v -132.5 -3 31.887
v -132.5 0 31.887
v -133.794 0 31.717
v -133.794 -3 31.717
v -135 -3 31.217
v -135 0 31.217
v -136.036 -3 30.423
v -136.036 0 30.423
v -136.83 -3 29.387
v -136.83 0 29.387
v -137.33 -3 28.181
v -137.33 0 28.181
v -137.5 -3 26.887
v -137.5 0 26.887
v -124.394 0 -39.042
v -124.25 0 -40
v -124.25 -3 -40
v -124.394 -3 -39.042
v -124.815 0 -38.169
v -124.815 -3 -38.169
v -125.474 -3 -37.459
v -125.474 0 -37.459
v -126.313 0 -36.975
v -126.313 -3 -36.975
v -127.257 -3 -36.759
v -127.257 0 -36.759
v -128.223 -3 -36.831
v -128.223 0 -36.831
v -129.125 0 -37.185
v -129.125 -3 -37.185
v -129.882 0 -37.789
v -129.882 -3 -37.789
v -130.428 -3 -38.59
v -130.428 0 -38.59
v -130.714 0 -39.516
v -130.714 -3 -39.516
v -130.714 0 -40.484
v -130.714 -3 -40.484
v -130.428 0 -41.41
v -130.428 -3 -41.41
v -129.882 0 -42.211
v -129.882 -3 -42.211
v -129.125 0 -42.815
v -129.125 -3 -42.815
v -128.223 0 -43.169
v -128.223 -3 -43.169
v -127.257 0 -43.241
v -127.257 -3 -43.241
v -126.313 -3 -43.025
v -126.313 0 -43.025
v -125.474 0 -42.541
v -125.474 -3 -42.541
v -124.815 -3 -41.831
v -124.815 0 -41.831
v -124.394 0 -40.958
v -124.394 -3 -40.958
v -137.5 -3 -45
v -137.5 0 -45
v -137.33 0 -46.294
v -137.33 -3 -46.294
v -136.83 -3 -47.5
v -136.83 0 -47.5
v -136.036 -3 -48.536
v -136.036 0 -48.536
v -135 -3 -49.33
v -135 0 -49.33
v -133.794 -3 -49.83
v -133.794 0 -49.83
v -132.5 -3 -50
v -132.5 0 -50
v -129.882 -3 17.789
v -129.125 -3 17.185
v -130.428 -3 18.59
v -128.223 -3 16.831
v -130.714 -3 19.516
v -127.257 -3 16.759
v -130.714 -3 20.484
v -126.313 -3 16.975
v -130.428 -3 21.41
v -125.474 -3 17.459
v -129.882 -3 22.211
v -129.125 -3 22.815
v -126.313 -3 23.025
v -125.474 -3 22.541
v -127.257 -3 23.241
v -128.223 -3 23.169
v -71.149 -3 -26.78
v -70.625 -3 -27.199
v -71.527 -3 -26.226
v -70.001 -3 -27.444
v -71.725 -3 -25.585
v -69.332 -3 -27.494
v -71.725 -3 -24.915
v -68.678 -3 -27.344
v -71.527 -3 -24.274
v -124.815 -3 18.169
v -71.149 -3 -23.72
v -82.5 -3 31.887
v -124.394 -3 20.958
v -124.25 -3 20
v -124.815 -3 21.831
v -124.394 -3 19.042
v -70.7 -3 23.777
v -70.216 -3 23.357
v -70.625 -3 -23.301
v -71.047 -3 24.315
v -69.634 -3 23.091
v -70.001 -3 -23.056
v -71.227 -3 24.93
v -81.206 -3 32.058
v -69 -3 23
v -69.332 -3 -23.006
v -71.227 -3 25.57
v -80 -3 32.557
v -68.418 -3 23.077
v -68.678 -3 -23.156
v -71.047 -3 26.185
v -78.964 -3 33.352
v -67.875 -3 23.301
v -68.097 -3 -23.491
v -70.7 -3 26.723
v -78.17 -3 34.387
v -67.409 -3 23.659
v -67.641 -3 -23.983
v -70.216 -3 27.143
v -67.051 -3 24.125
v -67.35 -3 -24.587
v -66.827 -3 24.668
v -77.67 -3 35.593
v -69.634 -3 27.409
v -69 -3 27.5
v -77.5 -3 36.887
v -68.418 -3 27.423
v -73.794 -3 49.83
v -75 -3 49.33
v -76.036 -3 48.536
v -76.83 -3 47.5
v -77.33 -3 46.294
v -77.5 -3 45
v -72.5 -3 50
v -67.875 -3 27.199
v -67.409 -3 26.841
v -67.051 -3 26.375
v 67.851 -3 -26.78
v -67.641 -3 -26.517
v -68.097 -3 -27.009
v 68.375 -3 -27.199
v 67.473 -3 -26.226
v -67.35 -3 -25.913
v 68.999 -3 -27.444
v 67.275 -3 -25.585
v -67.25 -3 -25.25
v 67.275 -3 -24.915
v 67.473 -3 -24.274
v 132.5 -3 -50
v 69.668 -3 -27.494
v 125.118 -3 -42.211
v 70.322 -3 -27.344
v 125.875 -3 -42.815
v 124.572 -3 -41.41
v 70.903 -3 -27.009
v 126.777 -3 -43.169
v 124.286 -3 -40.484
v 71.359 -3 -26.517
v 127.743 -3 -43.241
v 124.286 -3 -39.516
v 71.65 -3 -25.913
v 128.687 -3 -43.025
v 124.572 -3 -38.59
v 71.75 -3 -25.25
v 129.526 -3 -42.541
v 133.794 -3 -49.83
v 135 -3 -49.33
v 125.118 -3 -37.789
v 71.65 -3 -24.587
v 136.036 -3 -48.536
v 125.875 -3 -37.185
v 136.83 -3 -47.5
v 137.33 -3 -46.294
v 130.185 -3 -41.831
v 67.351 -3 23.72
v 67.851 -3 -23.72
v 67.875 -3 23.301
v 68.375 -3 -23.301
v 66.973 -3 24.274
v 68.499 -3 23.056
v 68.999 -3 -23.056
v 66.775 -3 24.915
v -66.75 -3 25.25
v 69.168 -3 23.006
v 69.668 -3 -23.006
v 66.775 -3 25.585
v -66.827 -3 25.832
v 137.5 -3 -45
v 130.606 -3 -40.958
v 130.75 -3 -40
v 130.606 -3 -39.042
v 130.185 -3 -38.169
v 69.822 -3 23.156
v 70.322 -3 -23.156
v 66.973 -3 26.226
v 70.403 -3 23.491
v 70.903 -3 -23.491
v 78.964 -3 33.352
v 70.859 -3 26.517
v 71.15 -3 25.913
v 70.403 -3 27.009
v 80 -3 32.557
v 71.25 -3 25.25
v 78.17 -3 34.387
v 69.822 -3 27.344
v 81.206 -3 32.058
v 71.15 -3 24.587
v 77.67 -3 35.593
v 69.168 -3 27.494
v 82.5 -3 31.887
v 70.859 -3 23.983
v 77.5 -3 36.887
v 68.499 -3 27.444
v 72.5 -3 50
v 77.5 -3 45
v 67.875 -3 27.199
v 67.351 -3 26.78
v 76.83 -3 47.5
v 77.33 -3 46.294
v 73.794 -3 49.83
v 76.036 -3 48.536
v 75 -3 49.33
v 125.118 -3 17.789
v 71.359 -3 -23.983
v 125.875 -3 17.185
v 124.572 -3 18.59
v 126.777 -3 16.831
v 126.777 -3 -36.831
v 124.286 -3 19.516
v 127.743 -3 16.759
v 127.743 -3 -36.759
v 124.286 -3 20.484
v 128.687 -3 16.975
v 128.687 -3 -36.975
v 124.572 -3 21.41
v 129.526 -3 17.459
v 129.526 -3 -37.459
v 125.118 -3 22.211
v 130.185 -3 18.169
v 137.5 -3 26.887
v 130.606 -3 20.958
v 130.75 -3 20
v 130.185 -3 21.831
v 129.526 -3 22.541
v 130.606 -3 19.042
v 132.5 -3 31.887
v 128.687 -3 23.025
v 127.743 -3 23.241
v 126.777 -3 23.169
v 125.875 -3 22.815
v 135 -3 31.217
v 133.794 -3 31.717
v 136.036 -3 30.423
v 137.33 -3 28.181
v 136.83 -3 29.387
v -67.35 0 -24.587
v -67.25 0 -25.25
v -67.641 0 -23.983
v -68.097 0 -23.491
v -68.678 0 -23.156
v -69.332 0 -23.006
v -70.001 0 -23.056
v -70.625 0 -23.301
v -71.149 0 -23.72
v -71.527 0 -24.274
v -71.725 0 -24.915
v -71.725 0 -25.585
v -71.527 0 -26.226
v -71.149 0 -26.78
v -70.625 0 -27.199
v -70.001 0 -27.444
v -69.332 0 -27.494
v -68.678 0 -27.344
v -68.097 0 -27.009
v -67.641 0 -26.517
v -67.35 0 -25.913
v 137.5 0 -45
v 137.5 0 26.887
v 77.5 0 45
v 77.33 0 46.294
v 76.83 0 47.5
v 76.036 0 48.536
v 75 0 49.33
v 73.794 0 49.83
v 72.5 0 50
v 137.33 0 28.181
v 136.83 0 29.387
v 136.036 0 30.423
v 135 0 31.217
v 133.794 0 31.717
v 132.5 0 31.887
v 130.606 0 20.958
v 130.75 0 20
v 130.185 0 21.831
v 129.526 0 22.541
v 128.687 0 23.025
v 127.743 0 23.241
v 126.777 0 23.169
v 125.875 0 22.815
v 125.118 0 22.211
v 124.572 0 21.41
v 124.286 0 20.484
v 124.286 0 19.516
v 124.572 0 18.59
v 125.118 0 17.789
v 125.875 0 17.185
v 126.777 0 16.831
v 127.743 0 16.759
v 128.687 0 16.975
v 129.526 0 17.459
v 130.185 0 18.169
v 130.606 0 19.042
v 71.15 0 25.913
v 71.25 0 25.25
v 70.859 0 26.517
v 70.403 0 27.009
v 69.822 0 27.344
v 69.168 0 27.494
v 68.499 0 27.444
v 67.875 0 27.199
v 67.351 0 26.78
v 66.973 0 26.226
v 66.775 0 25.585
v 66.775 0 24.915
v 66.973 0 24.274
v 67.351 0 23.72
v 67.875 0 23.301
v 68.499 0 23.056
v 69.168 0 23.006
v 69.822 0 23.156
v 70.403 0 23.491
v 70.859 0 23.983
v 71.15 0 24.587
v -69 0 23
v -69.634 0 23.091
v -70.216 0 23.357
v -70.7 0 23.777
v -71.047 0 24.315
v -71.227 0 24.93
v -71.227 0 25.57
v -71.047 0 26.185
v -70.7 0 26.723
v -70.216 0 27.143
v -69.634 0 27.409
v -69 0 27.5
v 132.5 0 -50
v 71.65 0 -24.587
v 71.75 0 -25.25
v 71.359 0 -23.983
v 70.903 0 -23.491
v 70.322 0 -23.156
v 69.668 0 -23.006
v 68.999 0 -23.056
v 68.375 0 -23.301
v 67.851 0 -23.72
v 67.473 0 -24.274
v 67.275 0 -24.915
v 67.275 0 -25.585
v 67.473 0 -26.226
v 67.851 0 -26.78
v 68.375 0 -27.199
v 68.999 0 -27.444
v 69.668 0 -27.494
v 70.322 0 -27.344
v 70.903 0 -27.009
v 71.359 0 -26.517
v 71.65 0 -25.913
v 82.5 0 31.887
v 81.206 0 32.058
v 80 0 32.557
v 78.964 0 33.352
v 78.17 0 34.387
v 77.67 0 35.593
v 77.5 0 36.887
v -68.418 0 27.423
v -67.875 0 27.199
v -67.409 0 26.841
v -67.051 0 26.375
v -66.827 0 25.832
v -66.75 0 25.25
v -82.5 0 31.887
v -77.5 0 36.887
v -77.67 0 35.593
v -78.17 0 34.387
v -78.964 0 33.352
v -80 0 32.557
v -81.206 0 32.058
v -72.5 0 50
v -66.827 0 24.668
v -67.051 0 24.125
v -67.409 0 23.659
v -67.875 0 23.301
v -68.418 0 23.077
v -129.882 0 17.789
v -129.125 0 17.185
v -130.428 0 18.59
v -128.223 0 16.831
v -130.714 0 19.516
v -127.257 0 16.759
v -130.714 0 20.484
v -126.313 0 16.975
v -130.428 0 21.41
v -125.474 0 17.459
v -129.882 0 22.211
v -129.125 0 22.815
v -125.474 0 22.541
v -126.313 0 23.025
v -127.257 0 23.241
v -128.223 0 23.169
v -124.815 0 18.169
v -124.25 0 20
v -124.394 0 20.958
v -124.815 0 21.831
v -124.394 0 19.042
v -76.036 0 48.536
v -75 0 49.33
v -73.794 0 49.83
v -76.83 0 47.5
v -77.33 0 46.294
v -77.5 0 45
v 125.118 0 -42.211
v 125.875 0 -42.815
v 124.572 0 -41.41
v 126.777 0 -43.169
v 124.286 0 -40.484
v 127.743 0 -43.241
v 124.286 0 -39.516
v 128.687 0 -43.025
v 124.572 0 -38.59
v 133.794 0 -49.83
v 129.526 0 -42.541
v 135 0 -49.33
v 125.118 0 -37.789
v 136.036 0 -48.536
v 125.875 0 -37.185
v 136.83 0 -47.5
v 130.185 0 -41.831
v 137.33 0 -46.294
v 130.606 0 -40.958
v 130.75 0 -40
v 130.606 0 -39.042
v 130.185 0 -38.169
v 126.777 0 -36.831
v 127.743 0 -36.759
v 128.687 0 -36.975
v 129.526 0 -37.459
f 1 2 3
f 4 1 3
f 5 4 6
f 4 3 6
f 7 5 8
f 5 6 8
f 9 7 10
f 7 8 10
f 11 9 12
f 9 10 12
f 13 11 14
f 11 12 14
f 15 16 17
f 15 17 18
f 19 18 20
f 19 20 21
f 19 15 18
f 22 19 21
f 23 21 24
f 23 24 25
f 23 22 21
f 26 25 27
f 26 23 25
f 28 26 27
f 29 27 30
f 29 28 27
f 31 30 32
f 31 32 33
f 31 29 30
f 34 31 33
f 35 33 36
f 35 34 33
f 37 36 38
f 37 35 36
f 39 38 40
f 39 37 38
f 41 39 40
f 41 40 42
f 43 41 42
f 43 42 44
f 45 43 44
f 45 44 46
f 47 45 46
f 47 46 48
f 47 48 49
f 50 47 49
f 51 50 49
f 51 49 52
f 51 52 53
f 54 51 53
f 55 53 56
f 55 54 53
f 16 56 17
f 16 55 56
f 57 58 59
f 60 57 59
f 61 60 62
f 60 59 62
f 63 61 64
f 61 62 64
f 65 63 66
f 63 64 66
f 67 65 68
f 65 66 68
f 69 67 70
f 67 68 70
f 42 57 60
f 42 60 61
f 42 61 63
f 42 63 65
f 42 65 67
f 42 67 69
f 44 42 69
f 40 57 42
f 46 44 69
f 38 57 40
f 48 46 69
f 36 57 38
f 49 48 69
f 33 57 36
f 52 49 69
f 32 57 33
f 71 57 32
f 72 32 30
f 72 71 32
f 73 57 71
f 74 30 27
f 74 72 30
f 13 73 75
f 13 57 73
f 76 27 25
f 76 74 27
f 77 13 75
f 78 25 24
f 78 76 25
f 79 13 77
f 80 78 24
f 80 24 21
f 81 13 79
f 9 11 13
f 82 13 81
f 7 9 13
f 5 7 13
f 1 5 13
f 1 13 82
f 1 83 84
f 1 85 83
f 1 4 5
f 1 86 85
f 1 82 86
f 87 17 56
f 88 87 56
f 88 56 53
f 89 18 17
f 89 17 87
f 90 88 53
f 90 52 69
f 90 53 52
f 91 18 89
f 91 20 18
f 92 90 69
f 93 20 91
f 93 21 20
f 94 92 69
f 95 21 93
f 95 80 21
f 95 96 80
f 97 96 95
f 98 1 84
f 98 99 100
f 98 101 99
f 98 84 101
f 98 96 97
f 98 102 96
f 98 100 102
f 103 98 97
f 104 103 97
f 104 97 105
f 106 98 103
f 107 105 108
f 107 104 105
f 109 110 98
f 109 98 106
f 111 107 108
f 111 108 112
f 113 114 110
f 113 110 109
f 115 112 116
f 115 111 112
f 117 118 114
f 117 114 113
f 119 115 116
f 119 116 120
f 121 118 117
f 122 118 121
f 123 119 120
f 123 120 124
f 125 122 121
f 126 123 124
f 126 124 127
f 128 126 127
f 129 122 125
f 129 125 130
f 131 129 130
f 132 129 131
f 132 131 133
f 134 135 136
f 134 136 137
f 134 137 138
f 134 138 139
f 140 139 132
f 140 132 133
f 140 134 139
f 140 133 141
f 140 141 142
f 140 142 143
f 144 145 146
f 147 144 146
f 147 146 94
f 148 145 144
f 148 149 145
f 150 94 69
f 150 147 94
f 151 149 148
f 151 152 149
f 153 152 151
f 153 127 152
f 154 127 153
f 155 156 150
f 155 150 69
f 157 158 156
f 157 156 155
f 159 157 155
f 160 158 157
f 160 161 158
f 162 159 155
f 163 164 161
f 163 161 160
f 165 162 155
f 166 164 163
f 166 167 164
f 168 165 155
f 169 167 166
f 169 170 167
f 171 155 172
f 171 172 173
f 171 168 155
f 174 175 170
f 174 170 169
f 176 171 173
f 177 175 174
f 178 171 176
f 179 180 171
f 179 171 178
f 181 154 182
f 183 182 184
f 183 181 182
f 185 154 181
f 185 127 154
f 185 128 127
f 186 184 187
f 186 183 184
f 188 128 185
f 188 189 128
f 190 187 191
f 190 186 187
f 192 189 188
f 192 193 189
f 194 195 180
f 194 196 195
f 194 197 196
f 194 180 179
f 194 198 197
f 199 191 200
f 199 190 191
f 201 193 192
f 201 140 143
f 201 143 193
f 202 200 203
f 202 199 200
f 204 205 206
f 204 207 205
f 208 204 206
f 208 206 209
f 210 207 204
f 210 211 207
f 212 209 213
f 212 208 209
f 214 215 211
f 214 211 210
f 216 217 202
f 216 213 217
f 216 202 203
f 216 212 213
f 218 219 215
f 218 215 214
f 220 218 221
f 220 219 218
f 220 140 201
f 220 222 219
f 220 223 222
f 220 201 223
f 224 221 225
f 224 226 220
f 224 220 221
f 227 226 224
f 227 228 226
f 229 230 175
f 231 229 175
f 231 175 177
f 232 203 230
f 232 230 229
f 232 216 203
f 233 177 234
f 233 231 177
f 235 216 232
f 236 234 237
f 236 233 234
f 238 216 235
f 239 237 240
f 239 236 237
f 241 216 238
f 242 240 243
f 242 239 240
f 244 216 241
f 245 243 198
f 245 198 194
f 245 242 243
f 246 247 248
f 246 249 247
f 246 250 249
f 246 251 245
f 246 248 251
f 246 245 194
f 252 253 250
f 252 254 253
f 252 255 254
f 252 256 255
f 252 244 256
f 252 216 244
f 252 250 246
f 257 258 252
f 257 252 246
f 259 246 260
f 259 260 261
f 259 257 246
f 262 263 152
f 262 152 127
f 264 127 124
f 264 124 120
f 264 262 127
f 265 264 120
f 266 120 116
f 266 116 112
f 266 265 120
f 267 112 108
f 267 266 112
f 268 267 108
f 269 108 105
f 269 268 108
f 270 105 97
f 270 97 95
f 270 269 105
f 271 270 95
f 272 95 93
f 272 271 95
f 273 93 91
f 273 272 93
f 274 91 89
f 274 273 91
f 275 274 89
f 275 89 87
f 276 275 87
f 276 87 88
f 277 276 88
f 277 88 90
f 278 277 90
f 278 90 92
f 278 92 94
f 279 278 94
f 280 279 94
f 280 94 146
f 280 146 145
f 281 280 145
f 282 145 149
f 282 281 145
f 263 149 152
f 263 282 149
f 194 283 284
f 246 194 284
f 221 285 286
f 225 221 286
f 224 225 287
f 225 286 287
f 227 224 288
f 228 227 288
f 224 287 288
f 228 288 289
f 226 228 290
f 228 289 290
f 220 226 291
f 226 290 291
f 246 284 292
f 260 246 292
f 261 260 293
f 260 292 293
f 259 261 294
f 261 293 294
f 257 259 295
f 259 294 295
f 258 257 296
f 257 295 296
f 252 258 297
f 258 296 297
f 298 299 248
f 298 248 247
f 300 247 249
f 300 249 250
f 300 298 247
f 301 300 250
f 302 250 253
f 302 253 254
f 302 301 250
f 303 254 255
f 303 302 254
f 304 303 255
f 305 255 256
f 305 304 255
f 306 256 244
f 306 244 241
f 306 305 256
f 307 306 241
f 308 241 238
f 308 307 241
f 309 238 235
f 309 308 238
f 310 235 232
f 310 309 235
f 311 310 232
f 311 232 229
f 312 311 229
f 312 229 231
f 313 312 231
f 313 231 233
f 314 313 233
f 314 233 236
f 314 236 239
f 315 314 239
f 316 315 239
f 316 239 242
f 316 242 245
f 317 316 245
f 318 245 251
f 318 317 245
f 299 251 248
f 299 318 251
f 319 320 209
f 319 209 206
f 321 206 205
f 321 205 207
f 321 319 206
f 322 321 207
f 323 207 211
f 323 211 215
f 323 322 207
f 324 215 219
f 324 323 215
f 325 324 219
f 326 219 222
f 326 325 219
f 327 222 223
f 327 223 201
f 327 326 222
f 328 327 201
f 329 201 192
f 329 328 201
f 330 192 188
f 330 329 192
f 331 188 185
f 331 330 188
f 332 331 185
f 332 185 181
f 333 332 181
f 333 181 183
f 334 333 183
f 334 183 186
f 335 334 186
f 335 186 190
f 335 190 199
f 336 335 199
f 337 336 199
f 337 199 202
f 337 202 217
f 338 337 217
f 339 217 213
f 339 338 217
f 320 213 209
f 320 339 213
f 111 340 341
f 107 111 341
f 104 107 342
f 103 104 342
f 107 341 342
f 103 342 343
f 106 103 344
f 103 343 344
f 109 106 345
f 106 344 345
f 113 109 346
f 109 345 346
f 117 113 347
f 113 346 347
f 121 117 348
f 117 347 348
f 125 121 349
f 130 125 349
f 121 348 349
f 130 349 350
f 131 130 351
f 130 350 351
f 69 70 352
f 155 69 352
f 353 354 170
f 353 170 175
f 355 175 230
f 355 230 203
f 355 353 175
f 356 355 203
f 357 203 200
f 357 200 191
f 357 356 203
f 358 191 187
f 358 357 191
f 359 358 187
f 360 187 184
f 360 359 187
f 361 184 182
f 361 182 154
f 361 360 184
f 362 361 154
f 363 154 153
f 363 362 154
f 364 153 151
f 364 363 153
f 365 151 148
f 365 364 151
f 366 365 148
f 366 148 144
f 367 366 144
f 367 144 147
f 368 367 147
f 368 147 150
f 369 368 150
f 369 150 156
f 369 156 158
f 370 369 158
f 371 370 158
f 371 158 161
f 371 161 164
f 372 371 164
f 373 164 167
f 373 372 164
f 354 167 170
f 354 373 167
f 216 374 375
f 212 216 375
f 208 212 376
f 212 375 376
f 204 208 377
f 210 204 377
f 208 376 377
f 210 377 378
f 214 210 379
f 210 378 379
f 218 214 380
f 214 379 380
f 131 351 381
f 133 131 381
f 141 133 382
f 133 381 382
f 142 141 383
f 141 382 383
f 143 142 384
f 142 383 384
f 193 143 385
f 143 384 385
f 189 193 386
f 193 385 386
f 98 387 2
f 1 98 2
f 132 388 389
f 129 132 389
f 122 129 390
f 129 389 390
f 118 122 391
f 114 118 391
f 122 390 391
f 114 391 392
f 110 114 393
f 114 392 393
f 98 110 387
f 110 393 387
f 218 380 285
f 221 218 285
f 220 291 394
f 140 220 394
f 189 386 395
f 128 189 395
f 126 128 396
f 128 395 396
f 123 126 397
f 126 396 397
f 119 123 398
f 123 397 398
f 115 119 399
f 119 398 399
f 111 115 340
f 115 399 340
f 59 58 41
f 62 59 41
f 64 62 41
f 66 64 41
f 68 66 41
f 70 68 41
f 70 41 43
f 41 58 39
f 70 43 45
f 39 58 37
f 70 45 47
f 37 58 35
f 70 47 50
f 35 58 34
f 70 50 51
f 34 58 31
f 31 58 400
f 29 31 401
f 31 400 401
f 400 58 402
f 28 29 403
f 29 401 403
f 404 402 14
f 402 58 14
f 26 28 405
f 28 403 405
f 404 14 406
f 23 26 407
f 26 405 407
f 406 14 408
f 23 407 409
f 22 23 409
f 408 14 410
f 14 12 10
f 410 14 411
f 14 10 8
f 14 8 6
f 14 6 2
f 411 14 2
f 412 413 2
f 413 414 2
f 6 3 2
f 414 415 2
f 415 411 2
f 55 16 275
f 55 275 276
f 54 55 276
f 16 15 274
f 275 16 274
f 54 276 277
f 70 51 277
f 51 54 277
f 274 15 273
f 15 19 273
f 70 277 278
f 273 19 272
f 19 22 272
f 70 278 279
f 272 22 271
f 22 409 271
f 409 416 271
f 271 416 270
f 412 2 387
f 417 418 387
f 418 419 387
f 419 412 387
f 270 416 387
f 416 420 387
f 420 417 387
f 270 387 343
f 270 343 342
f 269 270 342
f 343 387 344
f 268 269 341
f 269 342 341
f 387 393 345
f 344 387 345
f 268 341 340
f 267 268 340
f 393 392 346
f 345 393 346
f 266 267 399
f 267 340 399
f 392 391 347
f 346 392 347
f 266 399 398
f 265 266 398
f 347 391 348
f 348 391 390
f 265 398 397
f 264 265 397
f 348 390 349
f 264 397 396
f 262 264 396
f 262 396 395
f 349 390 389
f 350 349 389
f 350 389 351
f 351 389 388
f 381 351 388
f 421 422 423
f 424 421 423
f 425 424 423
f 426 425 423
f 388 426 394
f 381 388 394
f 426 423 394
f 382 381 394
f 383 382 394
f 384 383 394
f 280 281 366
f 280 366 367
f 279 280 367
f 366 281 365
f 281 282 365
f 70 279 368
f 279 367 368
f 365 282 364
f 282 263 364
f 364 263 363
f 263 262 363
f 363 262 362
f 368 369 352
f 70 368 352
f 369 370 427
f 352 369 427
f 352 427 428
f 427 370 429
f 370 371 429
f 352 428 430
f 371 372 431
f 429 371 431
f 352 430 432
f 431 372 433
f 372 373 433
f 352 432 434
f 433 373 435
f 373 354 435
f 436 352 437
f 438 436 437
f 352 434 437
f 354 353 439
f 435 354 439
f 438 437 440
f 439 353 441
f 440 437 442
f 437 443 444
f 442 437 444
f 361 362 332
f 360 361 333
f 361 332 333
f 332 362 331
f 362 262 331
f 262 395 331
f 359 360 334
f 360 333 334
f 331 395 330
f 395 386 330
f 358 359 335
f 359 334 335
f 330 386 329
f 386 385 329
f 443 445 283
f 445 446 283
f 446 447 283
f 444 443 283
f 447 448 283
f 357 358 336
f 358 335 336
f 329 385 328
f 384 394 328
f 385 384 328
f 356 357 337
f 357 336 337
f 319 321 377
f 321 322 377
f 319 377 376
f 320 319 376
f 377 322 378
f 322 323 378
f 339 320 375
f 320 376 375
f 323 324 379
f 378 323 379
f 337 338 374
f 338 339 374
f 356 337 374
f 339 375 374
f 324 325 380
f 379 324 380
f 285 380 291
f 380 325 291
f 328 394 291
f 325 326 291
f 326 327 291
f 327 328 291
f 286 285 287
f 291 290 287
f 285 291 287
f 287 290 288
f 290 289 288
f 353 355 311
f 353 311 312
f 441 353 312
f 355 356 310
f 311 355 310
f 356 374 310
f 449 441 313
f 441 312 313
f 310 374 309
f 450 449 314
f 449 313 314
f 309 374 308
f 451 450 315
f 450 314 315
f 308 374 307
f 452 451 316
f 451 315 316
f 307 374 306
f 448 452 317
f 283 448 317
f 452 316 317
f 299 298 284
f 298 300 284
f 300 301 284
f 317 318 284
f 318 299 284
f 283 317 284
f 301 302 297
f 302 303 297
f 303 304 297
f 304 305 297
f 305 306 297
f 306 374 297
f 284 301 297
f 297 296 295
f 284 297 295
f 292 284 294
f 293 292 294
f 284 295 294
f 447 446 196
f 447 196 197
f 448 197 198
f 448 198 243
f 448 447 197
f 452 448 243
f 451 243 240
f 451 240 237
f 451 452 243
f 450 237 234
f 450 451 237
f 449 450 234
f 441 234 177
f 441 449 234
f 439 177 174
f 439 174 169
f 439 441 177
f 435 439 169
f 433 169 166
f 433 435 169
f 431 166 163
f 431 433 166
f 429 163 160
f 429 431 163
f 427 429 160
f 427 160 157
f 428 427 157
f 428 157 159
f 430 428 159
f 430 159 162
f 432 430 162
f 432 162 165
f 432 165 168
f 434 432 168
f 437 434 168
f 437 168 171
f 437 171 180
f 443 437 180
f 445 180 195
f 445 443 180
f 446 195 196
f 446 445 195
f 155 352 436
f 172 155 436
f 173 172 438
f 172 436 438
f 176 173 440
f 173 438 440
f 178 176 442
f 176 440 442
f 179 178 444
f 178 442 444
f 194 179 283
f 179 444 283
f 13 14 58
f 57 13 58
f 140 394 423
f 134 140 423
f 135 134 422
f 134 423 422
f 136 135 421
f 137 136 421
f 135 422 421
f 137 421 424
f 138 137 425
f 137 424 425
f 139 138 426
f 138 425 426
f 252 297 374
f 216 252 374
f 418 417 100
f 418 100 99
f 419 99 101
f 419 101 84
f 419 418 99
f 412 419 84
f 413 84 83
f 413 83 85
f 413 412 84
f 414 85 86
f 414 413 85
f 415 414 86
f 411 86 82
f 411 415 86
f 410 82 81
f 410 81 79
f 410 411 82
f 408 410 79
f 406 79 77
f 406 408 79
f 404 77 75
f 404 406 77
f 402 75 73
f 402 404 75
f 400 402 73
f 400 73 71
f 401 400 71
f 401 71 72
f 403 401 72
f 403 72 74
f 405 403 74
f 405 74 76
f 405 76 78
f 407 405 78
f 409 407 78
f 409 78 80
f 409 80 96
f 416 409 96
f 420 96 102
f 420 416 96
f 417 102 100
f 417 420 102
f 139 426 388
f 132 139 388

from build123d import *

# Parameters (mm, degrees)
F0_R     = 3.25
F0_R_2   = 2.25
F1_DEPTH = 3


with BuildPart() as f1:
    # F0 (on Front) → F1 (new body)
    with BuildSketch(Plane.XZ):
        with BuildLine():
            Line((-132.5, -50), (132.5, -50))
            ThreePointArc((132.5, -50), (136.035534, -48.535534), (137.5, -45))
            Line((137.5, -45), (137.5, 26.887341))
            ThreePointArc((137.5, 26.887341), (136.035534, 30.422875), (132.5, 31.887341))
            Line((132.5, 31.887341), (82.5, 31.887341))
            ThreePointArc((82.5, 31.887341), (78.964466, 33.351807), (77.5, 36.887341))
            Line((77.5, 36.887341), (77.5, 45))
            ThreePointArc((77.5, 45), (76.035534, 48.535534), (72.5, 50))
            Line((72.5, 50), (-72.5, 50))
            ThreePointArc((-72.5, 50), (-76.035534, 48.535534), (-77.5, 45))
            Line((-77.5, 45), (-77.5, 36.887341))
            ThreePointArc((-77.5, 36.887341), (-78.964466, 33.351807), (-82.5, 31.887341))
            Line((-82.5, 31.887341), (-132.5, 31.887341))
            ThreePointArc((-132.5, 31.887341), (-136.035534, 30.422875), (-137.5, 26.887341))
            Line((-137.5, 26.887341), (-137.5, -45))
            ThreePointArc((-137.5, -45), (-136.035534, -48.535534), (-132.5, -50))
        make_face()
        with Locations((-127.5, -40)):
            Circle(F0_R, mode=Mode.SUBTRACT)
        with Locations((-69.5, -25.25)):
            Circle(F0_R_2, mode=Mode.SUBTRACT)
        with Locations((127.5, -40)):
            Circle(F0_R, mode=Mode.SUBTRACT)
        with Locations((69.5, -25.25)):
            Circle(F0_R_2, mode=Mode.SUBTRACT)
        with Locations((-127.5, 20)):
            Circle(F0_R, mode=Mode.SUBTRACT)
        with BuildLine():
            ThreePointArc((-69, 27.5), (-67.40901, 26.84099), (-66.75, 25.25))
            ThreePointArc((-66.75, 25.25), (-67.40901, 23.65901), (-69, 23))
            ThreePointArc((-69, 23), (-71.25, 25.25), (-69, 27.5))
        make_face(mode=Mode.SUBTRACT)
        with Locations((127.5, 20)):
            Circle(F0_R, mode=Mode.SUBTRACT)
        with Locations((69, 25.25)):
            Circle(F0_R_2, mode=Mode.SUBTRACT)
    extrude(amount=F1_DEPTH)


solid = f1.part
